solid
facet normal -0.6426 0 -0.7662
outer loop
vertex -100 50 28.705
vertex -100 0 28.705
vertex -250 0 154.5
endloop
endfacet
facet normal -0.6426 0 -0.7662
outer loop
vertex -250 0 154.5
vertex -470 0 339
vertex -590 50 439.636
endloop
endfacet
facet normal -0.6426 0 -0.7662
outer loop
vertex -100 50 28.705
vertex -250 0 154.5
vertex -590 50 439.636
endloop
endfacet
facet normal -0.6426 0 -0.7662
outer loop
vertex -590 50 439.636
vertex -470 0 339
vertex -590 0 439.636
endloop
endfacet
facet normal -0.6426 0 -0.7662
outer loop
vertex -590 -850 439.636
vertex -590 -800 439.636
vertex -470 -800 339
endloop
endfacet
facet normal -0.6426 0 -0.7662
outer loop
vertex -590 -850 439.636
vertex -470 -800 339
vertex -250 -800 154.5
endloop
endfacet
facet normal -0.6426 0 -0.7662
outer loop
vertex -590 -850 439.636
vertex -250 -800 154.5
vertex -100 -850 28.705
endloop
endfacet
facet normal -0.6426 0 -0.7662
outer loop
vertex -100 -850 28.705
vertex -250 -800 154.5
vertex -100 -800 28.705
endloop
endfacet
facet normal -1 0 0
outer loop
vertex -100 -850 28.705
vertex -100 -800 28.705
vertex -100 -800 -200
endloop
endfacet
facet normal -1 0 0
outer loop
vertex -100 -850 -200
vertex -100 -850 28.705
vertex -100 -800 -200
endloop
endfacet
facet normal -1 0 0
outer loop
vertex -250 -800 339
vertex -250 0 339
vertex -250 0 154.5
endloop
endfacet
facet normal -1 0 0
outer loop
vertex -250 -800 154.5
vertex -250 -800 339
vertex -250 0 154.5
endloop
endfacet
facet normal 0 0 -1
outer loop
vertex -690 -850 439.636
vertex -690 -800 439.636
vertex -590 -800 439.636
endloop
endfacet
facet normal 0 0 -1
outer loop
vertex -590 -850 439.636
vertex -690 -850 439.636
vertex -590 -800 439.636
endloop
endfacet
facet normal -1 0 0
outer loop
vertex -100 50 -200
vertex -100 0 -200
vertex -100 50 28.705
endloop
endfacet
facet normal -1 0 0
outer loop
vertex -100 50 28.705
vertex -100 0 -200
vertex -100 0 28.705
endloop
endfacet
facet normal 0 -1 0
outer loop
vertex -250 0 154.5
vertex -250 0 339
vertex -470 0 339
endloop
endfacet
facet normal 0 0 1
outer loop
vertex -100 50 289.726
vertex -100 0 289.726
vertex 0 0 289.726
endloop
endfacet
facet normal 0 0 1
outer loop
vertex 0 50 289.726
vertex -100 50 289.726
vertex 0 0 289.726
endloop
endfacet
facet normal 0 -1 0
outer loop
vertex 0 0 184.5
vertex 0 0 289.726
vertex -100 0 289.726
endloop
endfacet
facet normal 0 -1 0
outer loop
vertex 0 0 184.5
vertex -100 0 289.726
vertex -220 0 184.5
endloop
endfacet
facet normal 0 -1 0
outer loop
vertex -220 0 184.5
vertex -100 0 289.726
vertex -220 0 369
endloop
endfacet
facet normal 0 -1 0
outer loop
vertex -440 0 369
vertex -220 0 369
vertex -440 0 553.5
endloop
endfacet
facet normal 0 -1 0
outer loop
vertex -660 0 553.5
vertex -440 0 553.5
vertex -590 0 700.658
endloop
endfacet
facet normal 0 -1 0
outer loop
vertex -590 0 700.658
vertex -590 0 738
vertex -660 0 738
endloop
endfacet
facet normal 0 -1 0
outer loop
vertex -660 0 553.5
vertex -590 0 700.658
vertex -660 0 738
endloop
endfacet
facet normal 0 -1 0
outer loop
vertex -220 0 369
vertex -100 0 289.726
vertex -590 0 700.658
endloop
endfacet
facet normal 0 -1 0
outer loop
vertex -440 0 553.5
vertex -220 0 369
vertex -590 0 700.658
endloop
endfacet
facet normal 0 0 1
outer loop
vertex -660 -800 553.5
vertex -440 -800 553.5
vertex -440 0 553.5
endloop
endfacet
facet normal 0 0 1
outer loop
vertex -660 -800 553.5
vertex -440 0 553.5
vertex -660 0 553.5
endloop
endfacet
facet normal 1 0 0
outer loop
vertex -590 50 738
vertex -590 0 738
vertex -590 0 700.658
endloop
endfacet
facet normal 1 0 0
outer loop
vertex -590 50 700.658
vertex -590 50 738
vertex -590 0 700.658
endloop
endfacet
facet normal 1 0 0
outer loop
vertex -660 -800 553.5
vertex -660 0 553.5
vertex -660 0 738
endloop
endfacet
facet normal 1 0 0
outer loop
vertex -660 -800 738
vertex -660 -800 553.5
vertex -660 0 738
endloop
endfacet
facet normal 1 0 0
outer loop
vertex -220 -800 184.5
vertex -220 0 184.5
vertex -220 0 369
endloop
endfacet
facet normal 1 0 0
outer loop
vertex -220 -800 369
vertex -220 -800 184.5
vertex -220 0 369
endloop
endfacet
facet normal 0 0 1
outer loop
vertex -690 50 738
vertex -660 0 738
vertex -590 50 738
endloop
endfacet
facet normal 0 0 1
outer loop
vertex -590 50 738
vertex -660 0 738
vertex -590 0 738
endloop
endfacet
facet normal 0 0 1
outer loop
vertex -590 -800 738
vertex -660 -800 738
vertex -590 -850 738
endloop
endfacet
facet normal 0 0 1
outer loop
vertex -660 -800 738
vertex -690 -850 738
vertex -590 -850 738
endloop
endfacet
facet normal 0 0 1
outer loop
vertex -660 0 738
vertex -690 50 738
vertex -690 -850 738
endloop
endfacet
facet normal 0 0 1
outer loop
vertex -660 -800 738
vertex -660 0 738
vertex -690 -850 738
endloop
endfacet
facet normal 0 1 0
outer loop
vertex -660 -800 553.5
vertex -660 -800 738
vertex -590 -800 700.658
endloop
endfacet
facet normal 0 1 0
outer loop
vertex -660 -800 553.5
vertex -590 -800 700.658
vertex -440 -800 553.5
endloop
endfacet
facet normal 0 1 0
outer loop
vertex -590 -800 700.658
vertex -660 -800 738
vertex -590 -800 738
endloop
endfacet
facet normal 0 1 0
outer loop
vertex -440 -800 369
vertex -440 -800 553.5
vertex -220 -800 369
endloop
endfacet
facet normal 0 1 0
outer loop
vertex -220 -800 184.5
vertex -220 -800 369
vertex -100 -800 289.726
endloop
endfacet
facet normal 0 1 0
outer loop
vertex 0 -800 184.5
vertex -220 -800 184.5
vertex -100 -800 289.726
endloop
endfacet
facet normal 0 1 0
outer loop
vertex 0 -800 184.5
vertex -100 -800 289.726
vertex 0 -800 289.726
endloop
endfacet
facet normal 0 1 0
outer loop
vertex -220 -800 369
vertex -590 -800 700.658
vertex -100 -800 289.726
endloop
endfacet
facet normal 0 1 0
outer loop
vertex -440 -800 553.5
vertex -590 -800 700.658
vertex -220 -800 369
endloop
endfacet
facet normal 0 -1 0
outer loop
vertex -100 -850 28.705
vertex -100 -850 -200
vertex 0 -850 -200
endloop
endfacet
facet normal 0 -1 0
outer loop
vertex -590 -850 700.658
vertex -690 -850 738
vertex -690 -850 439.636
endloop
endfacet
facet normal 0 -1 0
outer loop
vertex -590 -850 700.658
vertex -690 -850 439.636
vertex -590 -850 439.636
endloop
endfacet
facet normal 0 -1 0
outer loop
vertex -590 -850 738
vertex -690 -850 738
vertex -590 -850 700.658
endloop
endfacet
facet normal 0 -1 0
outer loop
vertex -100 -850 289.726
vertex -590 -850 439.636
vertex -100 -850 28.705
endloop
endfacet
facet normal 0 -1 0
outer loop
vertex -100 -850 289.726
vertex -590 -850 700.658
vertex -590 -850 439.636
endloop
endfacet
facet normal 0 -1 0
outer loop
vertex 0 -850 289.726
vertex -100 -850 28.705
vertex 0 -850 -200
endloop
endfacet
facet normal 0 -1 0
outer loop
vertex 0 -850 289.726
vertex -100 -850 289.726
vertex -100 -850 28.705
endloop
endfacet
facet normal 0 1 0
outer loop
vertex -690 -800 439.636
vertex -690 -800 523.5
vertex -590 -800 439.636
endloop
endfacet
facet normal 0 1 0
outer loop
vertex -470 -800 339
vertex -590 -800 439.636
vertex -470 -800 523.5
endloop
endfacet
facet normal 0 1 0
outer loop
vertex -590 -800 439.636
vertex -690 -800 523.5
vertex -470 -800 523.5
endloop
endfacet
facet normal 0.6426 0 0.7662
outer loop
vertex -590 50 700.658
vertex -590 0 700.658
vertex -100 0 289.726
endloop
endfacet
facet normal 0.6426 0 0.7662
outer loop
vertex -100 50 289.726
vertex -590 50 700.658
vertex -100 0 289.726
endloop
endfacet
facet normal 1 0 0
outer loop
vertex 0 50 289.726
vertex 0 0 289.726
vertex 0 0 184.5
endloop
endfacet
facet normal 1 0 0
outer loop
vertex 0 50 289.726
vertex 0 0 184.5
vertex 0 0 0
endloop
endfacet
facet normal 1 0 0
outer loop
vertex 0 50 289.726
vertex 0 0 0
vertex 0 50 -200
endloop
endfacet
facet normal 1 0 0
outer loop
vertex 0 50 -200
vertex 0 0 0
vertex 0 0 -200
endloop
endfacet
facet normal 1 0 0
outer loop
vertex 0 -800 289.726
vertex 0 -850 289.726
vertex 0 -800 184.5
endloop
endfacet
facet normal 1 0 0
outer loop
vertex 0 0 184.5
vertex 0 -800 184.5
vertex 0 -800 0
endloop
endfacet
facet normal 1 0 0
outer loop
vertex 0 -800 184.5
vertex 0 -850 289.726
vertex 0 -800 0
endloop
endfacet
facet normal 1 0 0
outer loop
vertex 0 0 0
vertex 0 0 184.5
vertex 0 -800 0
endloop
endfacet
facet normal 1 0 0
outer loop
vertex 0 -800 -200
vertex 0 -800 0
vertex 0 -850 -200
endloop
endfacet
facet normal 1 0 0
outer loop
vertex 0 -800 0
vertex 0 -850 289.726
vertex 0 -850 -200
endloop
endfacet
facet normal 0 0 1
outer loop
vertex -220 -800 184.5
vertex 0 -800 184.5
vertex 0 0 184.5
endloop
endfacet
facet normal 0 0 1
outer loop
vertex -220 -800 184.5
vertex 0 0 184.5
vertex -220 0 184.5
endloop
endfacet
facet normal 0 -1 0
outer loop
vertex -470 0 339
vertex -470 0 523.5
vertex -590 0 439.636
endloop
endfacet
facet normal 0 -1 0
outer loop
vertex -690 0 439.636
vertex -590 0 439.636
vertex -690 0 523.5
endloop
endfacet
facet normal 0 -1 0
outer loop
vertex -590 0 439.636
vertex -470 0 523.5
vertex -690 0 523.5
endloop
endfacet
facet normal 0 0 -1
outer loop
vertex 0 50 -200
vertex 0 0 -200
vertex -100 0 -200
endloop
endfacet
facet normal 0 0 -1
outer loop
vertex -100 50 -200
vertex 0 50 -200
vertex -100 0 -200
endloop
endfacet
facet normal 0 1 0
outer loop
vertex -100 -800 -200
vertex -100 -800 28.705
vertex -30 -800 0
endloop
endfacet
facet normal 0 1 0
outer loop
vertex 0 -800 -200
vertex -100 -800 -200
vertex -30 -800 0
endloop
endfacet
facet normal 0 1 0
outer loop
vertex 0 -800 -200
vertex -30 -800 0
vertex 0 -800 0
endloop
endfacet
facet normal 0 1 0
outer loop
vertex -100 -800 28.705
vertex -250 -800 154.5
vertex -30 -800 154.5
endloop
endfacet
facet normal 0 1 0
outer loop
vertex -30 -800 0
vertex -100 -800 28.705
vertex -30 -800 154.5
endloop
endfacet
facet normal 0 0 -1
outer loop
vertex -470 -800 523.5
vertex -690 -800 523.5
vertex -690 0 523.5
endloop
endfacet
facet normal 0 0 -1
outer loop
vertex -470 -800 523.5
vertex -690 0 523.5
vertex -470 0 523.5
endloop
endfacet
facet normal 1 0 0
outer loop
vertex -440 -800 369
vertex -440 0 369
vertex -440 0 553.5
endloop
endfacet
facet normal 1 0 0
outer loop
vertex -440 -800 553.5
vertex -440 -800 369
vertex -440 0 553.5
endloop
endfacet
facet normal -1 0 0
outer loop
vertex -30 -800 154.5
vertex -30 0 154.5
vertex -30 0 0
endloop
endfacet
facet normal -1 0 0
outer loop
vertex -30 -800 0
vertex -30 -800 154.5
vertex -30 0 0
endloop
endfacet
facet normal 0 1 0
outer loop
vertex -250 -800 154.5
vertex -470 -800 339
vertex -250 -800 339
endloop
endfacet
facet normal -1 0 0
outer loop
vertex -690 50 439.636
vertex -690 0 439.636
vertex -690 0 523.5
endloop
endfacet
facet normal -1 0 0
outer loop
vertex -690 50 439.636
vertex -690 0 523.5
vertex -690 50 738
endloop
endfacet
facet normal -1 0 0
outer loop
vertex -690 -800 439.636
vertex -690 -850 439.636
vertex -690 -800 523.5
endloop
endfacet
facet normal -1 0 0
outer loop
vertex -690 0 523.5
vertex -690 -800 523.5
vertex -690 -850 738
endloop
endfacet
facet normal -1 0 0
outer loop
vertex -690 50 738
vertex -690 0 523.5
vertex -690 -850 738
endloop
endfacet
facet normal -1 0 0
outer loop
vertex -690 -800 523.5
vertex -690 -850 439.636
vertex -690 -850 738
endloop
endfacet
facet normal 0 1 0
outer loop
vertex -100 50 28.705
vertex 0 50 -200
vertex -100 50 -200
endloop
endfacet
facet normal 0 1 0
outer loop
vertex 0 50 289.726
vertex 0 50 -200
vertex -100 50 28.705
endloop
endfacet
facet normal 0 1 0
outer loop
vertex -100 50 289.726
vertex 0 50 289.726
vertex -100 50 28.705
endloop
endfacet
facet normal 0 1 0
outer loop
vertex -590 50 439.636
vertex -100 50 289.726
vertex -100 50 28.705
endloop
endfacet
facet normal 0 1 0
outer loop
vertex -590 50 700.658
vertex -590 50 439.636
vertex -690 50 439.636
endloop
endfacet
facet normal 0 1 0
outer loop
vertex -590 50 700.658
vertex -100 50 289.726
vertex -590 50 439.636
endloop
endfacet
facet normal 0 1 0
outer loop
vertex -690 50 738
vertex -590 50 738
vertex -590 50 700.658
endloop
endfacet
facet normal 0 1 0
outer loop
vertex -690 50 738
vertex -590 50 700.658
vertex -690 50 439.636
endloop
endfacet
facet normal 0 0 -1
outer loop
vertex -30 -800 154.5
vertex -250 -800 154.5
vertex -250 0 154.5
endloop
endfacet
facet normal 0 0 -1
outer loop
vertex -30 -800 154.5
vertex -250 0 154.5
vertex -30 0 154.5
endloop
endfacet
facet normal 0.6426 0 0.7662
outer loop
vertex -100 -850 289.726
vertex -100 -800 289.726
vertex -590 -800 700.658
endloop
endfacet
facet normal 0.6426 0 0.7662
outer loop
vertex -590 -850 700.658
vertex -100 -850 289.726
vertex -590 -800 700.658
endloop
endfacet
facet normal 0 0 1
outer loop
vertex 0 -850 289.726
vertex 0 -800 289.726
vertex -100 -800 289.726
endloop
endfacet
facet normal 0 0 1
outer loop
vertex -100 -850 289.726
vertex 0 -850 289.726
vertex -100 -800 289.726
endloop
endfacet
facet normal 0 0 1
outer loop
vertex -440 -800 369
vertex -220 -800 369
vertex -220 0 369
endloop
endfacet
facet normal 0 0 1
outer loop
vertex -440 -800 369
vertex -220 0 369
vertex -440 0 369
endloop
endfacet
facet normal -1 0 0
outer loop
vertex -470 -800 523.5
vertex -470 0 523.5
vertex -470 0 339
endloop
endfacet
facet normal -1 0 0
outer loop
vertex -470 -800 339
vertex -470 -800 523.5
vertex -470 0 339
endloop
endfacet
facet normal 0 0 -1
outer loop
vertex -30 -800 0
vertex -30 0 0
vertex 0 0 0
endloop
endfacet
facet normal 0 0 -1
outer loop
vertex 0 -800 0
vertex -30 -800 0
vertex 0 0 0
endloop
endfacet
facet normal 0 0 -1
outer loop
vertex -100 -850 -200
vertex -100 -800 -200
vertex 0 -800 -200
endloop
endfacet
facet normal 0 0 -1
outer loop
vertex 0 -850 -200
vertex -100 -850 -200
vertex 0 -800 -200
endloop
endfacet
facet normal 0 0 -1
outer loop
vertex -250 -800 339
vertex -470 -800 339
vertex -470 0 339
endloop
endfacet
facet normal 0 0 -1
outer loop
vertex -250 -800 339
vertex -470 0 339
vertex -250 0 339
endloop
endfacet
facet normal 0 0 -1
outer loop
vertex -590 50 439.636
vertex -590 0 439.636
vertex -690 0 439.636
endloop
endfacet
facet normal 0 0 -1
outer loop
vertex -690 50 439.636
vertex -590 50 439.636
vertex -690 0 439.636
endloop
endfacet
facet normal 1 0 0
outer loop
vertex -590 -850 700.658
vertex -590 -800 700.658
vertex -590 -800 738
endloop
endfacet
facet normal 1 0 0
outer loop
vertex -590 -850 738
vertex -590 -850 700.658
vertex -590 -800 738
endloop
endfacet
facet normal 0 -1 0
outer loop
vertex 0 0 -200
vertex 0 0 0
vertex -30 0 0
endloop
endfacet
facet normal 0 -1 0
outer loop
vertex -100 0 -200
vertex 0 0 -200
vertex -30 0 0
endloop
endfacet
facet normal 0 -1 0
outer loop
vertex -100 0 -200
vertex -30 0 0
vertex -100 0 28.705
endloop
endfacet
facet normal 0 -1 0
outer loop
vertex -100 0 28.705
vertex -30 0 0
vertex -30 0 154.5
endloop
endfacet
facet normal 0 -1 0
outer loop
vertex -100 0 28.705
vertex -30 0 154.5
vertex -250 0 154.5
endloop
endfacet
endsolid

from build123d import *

# Parameters (mm, degrees)
F0_W     = 30
F0_H     = 154.5
F0_H_2   = 30
F0_W_2   = 190
F0_H_3   = 184.5
F1_DEPTH = 800
F3_DEPTH = 50
F5_DEPTH = 50


with BuildPart() as f1:
    # F0 (on Front) → F1 (new body)
    with BuildSketch(Plane.XZ):
        with Locations((-15, 77.25)):
            Rectangle(F0_W, F0_H)
        with Locations((-15, 169.5)):
            Rectangle(F0_W, F0_H_2)
        with Locations((-125, 169.5)):
            Rectangle(F0_W_2, F0_H_2)
        with Locations((-235, 169.5)):
            Rectangle(F0_W, F0_H_2)
        with Locations((-235, 261.75)):
            Rectangle(F0_W, F0_H)
        with Locations((-235, 354)):
            Rectangle(F0_W, F0_H_2)
        with Locations((-345, 354)):
            Rectangle(F0_W_2, F0_H_2)
        with Locations((-455, 354)):
            Rectangle(F0_W, F0_H_2)
        with Locations((-455, 446.25)):
            Rectangle(F0_W, F0_H)
        with Locations((-455, 538.5)):
            Rectangle(F0_W, F0_H_2)
        with Locations((-565, 538.5)):
            Rectangle(F0_W_2, F0_H_2)
        with Locations((-675, 538.5)):
            Rectangle(F0_W, F0_H_2)
        with Locations((-675, 645.75)):
            Rectangle(F0_W, F0_H_3)
    extrude(amount=F1_DEPTH)

    # F2 (on face) → F3 (join)
    with BuildSketch(Plane.XZ.offset(800)):
        Polygon((-690, 738), (-690, 523.5), (-590, 439.636364), (-590, 700.658275), (-590, 738), align=None)
        Polygon((-590, 439.636364), (-690, 523.5), (-690, 439.636364), align=None)
        Polygon((-590, 700.658275), (-590, 439.636364), (-100, 28.704545), (-100, 289.726456), align=None)
        Polygon((-100, 289.726456), (-100, 28.704545), (-100, -200), (0, -200), (0, 289.726456), align=None)
    extrude(amount=F3_DEPTH)

    # F4 (on face) → F5 (join)
    with BuildSketch(Plane(origin=(0, 0, 0), x_dir=(-1, 0, 0), z_dir=(0, 1, 0))):
        Polygon((0, 289.726456), (0, -200), (100, -200), (100, 28.704545), (100, 289.726456), align=None)
        Polygon((100, 289.726456), (100, 28.704545), (590, 439.636364), (590, 700.658275), align=None)
        Polygon((590, 700.658275), (590, 439.636364), (690, 439.636364), (690, 738), (590, 738), align=None)
    extrude(amount=F5_DEPTH)


solid = f1.part
